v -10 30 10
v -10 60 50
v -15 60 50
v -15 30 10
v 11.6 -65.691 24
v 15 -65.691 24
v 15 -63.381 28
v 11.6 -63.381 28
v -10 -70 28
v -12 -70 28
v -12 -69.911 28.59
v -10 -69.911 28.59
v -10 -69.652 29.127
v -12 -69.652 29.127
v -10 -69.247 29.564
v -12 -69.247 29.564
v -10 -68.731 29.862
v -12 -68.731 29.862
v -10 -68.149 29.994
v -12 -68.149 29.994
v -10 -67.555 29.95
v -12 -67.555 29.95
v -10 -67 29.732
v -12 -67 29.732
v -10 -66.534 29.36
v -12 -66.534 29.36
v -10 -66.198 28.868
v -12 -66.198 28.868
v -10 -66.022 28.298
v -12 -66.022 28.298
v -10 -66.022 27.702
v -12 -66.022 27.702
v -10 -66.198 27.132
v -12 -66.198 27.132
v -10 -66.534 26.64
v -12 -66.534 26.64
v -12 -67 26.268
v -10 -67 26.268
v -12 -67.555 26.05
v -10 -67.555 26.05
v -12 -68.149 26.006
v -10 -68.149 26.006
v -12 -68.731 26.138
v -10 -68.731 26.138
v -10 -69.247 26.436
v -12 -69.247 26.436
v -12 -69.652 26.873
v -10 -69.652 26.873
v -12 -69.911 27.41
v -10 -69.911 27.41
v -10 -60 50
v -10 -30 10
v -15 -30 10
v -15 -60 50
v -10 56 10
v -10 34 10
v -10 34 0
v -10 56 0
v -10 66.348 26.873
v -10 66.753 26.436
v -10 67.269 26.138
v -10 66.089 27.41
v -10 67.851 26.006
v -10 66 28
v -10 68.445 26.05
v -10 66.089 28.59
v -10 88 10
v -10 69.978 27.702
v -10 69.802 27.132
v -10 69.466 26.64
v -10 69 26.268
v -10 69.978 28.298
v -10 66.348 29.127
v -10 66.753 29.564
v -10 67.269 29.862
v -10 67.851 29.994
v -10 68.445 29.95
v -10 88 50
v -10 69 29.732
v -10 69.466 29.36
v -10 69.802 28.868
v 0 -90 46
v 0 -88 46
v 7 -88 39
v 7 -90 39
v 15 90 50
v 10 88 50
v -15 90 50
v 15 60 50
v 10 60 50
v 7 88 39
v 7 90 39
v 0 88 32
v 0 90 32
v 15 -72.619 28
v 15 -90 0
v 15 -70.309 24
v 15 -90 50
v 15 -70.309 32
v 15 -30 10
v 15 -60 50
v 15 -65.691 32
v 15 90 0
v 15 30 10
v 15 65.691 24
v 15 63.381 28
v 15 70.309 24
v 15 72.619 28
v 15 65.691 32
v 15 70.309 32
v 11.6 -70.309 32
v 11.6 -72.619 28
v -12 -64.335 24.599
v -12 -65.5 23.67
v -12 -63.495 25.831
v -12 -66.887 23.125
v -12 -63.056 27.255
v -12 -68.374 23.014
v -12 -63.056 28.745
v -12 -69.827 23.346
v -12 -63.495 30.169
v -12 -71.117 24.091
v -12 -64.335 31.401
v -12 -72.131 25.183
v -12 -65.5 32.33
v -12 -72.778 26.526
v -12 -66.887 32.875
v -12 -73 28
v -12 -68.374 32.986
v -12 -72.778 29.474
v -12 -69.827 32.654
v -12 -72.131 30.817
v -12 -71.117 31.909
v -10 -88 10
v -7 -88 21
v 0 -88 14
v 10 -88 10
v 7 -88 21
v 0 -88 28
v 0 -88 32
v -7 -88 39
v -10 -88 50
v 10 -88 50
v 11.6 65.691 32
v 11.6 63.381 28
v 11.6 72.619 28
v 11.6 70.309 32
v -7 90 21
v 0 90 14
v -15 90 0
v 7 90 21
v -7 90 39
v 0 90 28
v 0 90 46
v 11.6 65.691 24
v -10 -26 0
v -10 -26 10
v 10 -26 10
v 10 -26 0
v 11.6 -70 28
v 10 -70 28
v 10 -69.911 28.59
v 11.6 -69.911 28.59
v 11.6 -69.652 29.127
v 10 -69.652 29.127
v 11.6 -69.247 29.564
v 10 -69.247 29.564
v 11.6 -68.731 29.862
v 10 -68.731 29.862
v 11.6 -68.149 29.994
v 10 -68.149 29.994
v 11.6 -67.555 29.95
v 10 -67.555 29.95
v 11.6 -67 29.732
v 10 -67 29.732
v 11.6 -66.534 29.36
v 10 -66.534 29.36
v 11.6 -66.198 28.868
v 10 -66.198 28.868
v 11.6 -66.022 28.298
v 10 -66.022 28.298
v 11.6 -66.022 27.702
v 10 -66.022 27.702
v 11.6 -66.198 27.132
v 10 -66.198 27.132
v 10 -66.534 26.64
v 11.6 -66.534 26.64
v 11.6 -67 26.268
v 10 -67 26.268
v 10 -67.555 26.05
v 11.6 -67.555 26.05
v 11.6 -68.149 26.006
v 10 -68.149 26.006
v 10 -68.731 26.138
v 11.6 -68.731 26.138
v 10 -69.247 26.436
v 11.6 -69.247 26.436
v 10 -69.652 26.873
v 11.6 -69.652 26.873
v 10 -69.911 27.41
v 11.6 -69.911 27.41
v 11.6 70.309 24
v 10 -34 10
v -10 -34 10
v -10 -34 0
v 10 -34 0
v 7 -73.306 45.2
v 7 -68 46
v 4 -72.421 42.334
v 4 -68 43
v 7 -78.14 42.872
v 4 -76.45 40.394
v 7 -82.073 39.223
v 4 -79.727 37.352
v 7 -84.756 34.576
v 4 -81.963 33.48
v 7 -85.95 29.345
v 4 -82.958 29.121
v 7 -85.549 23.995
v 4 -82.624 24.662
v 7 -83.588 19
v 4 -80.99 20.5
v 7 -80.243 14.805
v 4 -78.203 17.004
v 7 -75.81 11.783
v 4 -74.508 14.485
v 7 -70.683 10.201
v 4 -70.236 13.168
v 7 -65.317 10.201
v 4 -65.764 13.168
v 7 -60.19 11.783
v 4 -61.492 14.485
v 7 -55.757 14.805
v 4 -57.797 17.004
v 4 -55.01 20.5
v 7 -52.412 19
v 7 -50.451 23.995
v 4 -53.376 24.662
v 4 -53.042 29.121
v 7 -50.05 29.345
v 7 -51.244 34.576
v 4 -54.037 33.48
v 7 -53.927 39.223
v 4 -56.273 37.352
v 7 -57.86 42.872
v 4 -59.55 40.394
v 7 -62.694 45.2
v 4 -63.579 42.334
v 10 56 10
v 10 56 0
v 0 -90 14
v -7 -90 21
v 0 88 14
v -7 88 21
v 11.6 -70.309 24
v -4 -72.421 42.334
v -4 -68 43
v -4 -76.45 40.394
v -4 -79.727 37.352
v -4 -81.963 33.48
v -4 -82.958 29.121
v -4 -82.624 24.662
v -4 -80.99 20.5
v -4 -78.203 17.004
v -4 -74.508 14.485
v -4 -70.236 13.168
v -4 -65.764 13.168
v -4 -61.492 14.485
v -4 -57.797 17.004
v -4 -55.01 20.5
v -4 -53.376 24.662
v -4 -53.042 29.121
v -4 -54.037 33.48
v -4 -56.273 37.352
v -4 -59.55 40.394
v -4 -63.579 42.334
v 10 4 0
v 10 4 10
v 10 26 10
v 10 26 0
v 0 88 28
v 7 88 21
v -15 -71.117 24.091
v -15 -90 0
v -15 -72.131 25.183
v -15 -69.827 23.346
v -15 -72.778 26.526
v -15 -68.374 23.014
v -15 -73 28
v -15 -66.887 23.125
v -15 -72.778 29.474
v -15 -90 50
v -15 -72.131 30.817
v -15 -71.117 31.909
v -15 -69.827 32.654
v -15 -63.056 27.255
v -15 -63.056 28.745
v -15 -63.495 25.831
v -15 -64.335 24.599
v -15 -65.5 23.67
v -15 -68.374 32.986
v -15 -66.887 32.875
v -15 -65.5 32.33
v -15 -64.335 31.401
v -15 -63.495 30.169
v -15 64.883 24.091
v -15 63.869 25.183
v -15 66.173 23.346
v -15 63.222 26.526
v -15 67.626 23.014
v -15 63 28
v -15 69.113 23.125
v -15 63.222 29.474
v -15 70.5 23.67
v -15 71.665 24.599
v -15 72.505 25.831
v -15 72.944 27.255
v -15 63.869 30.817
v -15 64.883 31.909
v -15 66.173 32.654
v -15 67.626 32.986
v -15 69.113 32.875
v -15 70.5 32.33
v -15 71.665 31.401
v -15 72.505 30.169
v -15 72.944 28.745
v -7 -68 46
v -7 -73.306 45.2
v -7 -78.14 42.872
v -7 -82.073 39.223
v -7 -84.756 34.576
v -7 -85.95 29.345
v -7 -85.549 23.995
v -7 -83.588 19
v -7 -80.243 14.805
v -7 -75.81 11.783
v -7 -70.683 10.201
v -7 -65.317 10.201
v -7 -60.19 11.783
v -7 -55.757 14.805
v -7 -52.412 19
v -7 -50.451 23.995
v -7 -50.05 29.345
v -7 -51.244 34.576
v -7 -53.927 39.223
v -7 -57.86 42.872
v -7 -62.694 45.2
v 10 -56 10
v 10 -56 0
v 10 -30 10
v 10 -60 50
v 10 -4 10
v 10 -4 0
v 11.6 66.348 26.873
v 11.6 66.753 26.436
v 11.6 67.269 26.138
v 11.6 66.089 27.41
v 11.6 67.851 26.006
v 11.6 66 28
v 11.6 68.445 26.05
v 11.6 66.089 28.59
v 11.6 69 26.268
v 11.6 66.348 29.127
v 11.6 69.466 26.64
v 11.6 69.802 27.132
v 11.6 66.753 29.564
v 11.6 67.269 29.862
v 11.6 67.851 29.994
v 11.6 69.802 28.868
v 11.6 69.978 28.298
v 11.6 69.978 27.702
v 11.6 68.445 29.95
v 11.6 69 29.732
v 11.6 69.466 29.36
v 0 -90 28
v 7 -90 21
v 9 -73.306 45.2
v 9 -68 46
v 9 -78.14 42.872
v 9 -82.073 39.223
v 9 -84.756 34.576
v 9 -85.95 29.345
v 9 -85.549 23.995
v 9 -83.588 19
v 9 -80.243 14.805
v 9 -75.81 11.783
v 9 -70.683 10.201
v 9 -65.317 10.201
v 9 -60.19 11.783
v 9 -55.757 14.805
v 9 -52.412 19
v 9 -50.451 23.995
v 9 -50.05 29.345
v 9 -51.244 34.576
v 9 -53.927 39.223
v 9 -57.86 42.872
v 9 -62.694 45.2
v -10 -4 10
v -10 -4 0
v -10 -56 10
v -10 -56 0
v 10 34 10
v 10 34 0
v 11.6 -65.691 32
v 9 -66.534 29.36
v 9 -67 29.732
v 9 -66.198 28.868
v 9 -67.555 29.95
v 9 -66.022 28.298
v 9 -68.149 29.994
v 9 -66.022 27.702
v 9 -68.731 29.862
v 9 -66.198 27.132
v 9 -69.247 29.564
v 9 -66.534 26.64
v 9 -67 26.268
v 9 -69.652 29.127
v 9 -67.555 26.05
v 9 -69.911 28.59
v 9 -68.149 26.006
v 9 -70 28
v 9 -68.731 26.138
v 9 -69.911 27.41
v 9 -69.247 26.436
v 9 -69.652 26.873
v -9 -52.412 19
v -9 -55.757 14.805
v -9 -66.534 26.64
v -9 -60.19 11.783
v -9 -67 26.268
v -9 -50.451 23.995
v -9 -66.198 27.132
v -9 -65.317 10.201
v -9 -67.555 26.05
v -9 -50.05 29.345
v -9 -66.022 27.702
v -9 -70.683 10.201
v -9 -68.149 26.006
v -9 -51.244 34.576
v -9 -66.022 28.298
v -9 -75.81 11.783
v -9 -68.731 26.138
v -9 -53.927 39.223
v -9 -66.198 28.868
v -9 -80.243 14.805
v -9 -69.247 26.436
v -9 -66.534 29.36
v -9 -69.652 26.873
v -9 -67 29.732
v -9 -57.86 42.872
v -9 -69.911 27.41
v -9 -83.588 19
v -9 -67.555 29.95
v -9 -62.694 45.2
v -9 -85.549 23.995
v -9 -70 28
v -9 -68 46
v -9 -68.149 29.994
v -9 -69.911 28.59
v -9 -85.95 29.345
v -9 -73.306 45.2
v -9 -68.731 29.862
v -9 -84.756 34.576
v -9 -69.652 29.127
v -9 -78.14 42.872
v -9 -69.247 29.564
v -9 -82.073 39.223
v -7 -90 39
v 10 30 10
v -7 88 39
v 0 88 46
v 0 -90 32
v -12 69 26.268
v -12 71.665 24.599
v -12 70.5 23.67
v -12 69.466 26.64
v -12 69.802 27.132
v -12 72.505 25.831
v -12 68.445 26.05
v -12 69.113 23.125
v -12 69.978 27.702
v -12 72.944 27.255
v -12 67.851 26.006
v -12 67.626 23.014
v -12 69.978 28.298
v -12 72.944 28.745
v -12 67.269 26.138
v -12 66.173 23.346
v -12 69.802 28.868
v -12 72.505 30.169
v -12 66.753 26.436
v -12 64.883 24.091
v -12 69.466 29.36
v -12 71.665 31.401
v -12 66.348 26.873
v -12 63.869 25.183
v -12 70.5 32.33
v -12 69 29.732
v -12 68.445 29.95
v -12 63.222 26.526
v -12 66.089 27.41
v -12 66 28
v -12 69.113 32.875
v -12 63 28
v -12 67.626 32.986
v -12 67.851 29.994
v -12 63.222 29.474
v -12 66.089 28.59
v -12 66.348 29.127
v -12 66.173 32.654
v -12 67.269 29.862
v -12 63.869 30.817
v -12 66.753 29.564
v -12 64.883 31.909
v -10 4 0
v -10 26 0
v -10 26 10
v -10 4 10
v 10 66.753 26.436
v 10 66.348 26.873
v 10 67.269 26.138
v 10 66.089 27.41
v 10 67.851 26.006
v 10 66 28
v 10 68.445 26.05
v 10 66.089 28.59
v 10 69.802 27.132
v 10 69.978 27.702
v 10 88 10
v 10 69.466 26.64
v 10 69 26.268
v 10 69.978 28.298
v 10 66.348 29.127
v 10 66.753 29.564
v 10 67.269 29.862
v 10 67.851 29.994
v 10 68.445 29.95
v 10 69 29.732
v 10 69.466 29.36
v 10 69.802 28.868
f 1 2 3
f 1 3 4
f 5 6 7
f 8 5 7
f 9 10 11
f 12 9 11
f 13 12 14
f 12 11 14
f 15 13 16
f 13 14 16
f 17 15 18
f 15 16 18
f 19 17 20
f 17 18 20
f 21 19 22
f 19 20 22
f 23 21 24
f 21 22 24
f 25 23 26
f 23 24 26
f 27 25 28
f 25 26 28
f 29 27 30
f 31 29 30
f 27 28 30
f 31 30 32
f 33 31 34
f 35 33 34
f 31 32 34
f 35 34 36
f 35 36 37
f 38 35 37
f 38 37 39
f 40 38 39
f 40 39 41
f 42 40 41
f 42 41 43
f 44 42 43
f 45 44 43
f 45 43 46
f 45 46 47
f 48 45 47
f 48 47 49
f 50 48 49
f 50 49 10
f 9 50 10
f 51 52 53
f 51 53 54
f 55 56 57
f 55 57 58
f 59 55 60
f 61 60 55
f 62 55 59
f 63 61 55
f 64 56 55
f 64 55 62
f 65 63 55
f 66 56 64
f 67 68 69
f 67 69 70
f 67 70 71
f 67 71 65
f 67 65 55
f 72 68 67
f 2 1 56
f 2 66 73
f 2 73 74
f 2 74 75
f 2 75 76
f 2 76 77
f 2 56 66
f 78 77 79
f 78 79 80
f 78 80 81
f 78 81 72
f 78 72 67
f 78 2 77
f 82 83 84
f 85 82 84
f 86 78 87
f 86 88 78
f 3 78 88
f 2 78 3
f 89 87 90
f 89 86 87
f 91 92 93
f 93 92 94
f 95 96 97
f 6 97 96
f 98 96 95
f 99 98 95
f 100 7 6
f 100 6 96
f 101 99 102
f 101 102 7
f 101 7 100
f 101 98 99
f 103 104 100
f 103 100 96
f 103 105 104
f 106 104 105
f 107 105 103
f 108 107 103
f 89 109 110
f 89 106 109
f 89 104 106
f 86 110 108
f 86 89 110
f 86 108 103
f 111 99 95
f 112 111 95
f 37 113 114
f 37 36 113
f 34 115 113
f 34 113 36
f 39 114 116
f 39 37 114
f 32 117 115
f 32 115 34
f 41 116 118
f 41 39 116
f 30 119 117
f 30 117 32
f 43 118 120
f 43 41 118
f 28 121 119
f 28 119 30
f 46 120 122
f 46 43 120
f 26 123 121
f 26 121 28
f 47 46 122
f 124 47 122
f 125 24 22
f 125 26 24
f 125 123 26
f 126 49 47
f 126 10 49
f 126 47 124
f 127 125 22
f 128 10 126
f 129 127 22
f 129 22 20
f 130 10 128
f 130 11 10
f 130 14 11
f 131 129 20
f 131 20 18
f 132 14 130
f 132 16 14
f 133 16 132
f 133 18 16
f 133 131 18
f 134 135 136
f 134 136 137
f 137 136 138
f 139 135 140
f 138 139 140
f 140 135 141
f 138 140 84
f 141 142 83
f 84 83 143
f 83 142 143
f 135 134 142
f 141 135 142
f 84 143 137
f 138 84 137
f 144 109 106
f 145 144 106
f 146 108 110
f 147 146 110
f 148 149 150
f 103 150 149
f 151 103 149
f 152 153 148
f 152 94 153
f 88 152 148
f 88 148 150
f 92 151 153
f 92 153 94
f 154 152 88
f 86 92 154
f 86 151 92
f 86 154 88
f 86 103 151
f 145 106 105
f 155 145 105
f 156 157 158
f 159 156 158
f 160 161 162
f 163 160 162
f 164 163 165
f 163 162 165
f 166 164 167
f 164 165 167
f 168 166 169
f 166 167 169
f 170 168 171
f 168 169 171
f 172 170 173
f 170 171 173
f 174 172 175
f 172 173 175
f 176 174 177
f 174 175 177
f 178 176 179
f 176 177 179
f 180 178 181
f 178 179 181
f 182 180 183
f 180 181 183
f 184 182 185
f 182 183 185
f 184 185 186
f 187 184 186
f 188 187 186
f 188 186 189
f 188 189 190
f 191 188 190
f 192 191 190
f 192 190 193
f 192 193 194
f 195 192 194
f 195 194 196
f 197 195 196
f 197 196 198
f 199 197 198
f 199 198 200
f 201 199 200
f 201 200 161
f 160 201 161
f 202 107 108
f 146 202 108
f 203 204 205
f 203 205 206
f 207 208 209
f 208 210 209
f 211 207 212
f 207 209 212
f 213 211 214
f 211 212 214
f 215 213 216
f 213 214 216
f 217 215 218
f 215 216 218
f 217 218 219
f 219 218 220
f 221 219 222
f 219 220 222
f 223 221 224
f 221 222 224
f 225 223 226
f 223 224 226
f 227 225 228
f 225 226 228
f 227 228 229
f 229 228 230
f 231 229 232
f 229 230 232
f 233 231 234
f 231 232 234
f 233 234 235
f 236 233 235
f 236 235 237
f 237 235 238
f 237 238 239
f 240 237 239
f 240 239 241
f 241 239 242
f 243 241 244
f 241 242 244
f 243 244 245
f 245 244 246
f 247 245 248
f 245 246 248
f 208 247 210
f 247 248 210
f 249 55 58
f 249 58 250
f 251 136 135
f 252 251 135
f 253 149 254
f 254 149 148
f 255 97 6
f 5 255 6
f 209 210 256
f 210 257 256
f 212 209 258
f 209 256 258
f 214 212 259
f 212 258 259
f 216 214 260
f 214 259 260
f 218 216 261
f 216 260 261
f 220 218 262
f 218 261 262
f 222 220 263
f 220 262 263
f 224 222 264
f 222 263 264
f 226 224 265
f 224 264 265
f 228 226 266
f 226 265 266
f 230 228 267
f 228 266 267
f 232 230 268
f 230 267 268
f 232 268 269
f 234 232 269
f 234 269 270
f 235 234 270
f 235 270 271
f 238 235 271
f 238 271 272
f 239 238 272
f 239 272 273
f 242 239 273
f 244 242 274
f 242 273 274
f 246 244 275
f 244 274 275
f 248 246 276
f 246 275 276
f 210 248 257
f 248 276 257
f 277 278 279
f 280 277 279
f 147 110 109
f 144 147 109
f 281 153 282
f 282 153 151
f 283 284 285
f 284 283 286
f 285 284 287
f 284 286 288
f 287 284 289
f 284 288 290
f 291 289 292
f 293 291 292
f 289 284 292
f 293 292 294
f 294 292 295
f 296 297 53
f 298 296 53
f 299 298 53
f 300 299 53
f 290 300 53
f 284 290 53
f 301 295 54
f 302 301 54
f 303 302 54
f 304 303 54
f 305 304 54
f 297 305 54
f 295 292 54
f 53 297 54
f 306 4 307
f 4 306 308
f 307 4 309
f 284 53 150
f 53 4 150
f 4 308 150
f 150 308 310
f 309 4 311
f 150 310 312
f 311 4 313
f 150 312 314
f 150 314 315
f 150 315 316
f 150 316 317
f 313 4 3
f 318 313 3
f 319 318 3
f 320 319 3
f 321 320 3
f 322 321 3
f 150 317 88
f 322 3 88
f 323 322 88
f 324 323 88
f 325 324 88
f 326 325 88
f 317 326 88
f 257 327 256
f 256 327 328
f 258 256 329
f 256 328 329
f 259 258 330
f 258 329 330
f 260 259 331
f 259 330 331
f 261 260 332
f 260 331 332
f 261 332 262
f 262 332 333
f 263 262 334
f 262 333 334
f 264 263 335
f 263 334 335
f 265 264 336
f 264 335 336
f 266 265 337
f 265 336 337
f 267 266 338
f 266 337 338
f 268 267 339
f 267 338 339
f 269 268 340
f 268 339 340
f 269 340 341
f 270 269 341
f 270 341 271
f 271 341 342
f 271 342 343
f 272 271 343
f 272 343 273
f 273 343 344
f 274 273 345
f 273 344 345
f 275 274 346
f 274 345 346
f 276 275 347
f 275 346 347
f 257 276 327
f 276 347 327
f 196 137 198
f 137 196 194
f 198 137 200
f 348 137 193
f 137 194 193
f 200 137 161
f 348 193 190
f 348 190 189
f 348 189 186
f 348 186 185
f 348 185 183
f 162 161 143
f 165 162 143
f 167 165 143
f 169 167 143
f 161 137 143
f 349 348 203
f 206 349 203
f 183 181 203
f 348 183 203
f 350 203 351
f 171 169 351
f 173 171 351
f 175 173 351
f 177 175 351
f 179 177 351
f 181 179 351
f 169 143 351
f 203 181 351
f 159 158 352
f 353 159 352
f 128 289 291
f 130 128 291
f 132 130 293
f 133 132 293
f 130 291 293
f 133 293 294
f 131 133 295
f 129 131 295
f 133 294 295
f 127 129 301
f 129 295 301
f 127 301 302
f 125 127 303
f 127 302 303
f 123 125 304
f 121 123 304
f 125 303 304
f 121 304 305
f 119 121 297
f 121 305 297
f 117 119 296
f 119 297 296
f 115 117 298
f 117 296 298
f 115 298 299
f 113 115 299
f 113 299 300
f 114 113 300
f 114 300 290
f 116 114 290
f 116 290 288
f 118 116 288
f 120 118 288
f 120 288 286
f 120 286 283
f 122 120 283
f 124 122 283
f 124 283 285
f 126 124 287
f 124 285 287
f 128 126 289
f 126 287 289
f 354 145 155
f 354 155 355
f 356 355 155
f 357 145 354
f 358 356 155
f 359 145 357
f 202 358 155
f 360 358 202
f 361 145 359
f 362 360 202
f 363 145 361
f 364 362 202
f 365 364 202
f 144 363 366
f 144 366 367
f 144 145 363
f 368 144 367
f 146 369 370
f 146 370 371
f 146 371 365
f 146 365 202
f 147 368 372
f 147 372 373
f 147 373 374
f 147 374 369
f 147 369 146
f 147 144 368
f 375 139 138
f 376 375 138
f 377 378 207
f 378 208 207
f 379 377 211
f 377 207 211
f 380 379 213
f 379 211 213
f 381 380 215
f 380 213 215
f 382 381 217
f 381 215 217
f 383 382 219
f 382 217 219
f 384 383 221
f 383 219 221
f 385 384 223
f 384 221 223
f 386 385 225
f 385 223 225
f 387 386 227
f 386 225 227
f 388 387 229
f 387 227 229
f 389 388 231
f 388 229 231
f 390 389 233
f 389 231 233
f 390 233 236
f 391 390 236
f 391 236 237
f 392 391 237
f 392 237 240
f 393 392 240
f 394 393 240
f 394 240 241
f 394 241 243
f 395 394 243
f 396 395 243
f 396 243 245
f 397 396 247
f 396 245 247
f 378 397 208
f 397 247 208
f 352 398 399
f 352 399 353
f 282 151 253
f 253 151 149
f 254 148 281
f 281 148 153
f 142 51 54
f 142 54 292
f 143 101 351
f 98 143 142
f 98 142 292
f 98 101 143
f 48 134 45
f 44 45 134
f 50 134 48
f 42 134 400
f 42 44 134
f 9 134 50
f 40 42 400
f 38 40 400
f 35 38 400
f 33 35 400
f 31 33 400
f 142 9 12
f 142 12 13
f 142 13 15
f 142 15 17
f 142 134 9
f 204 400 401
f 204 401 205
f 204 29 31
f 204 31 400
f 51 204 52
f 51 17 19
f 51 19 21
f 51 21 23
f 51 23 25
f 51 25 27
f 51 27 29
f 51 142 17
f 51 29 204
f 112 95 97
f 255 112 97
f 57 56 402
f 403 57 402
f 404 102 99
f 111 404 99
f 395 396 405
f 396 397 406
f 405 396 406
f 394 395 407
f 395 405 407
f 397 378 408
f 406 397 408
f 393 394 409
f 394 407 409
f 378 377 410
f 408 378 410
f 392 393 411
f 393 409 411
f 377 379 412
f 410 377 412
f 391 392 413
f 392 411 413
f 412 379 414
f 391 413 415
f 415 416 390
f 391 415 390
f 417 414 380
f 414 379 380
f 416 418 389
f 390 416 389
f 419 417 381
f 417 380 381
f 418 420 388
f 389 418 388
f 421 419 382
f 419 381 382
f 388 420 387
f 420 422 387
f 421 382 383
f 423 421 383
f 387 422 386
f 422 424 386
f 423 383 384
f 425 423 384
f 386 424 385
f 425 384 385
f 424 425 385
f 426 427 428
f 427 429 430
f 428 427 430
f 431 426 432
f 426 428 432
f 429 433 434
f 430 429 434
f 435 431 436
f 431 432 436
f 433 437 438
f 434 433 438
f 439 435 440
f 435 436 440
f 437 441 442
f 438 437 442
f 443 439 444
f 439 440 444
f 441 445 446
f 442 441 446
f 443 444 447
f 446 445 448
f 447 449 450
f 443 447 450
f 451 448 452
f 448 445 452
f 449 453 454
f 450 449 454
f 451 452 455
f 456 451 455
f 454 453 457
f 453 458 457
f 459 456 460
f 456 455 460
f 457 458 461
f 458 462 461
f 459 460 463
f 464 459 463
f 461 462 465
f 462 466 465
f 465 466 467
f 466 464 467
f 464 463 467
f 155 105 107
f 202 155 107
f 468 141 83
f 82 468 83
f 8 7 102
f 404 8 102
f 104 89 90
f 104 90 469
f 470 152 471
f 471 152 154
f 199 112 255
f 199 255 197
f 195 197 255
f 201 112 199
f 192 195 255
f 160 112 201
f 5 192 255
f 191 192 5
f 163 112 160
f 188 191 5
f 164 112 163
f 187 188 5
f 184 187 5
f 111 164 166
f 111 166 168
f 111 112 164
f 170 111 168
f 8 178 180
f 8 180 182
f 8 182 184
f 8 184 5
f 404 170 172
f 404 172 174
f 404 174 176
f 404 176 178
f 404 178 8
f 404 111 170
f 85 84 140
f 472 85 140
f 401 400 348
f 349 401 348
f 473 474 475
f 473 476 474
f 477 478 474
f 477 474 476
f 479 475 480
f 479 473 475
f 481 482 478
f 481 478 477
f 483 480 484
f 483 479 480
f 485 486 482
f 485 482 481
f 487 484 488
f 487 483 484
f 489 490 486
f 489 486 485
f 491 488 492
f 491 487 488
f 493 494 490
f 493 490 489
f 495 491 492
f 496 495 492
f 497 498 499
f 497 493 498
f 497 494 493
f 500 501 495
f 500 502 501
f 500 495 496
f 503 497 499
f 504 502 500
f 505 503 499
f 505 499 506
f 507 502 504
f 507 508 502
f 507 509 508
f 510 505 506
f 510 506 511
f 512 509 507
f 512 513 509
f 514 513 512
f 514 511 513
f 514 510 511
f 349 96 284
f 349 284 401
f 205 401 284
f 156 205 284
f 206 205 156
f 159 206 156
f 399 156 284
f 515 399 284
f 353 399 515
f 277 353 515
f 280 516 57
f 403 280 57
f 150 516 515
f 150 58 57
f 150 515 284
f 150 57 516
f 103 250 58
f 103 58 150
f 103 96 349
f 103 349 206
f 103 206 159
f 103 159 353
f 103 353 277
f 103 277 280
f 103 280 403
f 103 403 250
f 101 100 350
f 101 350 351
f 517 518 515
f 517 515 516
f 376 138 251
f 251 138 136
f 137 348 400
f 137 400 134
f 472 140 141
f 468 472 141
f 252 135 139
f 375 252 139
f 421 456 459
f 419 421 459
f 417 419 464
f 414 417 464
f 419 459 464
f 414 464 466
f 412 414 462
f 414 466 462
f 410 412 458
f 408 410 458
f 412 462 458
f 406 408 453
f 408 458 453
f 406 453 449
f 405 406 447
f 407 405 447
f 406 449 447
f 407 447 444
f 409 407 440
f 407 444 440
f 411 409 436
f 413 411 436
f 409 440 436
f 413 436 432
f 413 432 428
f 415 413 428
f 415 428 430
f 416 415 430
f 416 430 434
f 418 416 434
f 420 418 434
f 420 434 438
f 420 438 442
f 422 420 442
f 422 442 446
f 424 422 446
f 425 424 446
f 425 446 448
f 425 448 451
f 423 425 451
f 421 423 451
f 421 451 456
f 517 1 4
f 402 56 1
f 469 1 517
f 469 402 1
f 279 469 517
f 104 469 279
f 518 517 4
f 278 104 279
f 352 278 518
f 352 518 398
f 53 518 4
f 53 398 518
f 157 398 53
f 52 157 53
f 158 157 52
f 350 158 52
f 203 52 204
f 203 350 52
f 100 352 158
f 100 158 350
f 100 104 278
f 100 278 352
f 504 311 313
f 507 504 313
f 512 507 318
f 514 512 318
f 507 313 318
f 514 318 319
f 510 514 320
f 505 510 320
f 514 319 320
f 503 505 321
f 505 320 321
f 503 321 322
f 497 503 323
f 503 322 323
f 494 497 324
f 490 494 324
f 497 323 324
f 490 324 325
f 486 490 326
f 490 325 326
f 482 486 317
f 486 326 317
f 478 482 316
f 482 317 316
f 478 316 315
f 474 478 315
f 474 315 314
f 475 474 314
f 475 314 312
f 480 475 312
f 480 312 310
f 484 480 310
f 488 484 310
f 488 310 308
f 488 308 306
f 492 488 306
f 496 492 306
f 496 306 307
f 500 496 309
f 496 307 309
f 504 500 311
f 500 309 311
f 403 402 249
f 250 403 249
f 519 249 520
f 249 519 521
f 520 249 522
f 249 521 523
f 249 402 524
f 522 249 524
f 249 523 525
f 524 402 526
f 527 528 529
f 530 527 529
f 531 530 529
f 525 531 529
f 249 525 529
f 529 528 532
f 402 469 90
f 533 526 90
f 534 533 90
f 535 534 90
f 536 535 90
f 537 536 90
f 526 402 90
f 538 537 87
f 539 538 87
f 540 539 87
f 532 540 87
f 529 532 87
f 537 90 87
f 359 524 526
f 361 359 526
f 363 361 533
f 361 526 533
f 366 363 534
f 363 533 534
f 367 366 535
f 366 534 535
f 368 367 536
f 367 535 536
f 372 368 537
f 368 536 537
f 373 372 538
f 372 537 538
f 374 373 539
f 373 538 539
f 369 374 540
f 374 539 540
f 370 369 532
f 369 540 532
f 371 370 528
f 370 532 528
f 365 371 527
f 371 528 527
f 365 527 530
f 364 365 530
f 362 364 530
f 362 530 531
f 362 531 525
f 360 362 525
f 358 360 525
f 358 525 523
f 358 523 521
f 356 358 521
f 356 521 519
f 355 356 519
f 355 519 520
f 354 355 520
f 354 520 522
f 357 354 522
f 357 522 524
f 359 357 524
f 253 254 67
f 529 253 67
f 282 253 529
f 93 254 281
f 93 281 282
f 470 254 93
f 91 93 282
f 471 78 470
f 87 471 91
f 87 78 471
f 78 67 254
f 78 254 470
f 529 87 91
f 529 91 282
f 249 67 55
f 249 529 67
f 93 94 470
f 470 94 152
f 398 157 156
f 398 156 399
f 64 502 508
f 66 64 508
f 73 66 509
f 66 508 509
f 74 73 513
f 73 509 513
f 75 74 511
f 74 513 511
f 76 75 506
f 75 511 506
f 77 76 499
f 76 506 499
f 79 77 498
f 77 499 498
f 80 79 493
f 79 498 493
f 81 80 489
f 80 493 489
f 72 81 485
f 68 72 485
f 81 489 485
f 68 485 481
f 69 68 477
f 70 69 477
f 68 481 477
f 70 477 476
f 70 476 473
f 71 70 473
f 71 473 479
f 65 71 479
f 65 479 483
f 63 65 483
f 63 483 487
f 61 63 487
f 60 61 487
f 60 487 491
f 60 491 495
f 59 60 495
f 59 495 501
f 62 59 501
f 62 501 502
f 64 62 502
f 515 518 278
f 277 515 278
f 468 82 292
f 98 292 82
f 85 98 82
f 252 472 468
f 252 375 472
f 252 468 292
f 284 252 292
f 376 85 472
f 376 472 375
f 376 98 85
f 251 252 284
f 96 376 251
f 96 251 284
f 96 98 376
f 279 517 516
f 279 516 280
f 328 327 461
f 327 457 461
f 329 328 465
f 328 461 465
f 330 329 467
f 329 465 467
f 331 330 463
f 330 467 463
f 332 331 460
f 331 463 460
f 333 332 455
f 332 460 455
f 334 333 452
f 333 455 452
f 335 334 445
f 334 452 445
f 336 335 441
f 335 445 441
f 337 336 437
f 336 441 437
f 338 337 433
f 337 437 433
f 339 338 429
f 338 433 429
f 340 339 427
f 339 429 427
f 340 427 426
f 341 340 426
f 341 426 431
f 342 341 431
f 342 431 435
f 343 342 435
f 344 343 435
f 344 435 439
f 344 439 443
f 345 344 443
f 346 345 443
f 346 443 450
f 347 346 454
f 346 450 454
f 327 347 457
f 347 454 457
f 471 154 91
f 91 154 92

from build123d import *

# Parameters (mm, degrees)
F0_R      = 15
F1_DEPTH  = 15
F2_W      = 20
F2_H      = 30
F3_DEPTH  = 40
F2_H_2    = 58
F2_H_3    = 28
F4_DEPTH  = 40
F9_D      = 4
F9_2_D    = 4
F10_W     = 20
F10_H     = 22
F11_DEPTH = 10
F12_DEPTH = 3.4
F13_R     = 5
F14_DEPTH = 3
F16_DEPTH = 180.001


with BuildPart() as f1:
    # F0 (on Right) → F1 (new body, symmetric)
    with BuildSketch(Plane.YZ):
        Polygon((-90, 0), (0, 0), (90, 0), (90, 50), (60, 50), (30, 10), (0, 10), (-30, 10), (-60, 50), (-90, 50), align=None)
        with Locations((-68, 28)):
            Circle(F0_R, mode=Mode.SUBTRACT)
        with Locations((-68, 28)):
            Circle(F0_R)
    extrude(amount=F1_DEPTH, both=True)

    # F2 (on face) → F3 (cut, through all)
    with BuildSketch(Plane.XY.offset(50)):
        with Locations((0, -45)):
            Rectangle(F2_W, F2_H)
    extrude(amount=-F3_DEPTH, mode=Mode.SUBTRACT)

    # F2 (on face) → F4 (cut, through all)
    with BuildSketch(Plane.XY.offset(50)):
        with Locations((0, 59)):
            Rectangle(F2_W, F2_H_2)
        with Locations((0, -74)):
            Rectangle(F2_W, F2_H_3)
    extrude(amount=-F4_DEPTH, mode=Mode.SUBTRACT)

    # F9 (through all)
    with Locations(Plane.YZ.offset(15)):
        with Locations((-68, 28), (68, 28)):
            Hole(F9_D / 2)

    # F10 (on face) → F11 (cut, through all)
    with BuildSketch(Plane.XY.offset(10)):
        with Locations((0, 15)):
            Rectangle(F10_W, F10_H)
        with Locations((0, -15)):
            Rectangle(F10_W, F10_H)
        with Locations((0, -45)):
            Rectangle(F10_W, F10_H)
        with Locations((0, 45)):
            Rectangle(F10_W, F10_H)
    extrude(amount=-F11_DEPTH, mode=Mode.SUBTRACT)

    # F8 (on face) → F12 (cut, through all)
    with BuildSketch(Plane.YZ.offset(15)):
        Polygon((-70.3094010768, 24), (-65.6905989232, 24), (-63.3811978465, 28), (-65.6905989232, 32), (-70.3094010768, 32), (-72.6188021535, 28), align=None)
        Polygon((70.3094010768, 32), (65.6905989232, 32), (63.3811978465, 28), (65.6905989232, 24), (70.3094010768, 24), (72.6188021535, 28), align=None)
    extrude(amount=-F12_DEPTH, mode=Mode.SUBTRACT)

    # F13 (on face) → F14 (cut)
    with BuildSketch(Plane(origin=(-15, 0, 0), x_dir=(0, -1, 0), z_dir=(-1, 0, 0))):
        with Locations((68, 28)):
            Circle(F13_R)
        with Locations((-68, 28)):
            Circle(F13_R)
    extrude(amount=-F14_DEPTH, mode=Mode.SUBTRACT)

    # F15 (on face) → F16 (cut, through all)
    with BuildSketch(Plane(origin=(0, 90, 0), x_dir=(-1, 0, 0), z_dir=(0, 1, 0))):
        Polygon((-7, 39), (0, 32), (7, 39), (0, 46), align=None)
        Polygon((7, 21), (0, 28), (-7, 21), (0, 14), align=None)
    extrude(amount=-F16_DEPTH, mode=Mode.SUBTRACT)


with BuildPart() as f7:
    # F6 (on plane+point) → F7 (revolve)
    with BuildSketch(Plane.XZ.offset(68)):
        Polygon((4, 43), (0, 43), (-4, 43), (-7, 46), (-9, 46), (-9, 28), (0, 28), (9, 28), (9, 46), (7, 46), align=None)
    revolve(axis=Axis((-4.5, -68, 28), (1, 0, 0)))

    # F9#2 (through all)
    with Locations(Plane.YZ.offset(15)):
        with Locations((-68, 28), (68, 28)):
            Hole(F9_2_D / 2)


solid = Compound([f1.part, f7.part])
